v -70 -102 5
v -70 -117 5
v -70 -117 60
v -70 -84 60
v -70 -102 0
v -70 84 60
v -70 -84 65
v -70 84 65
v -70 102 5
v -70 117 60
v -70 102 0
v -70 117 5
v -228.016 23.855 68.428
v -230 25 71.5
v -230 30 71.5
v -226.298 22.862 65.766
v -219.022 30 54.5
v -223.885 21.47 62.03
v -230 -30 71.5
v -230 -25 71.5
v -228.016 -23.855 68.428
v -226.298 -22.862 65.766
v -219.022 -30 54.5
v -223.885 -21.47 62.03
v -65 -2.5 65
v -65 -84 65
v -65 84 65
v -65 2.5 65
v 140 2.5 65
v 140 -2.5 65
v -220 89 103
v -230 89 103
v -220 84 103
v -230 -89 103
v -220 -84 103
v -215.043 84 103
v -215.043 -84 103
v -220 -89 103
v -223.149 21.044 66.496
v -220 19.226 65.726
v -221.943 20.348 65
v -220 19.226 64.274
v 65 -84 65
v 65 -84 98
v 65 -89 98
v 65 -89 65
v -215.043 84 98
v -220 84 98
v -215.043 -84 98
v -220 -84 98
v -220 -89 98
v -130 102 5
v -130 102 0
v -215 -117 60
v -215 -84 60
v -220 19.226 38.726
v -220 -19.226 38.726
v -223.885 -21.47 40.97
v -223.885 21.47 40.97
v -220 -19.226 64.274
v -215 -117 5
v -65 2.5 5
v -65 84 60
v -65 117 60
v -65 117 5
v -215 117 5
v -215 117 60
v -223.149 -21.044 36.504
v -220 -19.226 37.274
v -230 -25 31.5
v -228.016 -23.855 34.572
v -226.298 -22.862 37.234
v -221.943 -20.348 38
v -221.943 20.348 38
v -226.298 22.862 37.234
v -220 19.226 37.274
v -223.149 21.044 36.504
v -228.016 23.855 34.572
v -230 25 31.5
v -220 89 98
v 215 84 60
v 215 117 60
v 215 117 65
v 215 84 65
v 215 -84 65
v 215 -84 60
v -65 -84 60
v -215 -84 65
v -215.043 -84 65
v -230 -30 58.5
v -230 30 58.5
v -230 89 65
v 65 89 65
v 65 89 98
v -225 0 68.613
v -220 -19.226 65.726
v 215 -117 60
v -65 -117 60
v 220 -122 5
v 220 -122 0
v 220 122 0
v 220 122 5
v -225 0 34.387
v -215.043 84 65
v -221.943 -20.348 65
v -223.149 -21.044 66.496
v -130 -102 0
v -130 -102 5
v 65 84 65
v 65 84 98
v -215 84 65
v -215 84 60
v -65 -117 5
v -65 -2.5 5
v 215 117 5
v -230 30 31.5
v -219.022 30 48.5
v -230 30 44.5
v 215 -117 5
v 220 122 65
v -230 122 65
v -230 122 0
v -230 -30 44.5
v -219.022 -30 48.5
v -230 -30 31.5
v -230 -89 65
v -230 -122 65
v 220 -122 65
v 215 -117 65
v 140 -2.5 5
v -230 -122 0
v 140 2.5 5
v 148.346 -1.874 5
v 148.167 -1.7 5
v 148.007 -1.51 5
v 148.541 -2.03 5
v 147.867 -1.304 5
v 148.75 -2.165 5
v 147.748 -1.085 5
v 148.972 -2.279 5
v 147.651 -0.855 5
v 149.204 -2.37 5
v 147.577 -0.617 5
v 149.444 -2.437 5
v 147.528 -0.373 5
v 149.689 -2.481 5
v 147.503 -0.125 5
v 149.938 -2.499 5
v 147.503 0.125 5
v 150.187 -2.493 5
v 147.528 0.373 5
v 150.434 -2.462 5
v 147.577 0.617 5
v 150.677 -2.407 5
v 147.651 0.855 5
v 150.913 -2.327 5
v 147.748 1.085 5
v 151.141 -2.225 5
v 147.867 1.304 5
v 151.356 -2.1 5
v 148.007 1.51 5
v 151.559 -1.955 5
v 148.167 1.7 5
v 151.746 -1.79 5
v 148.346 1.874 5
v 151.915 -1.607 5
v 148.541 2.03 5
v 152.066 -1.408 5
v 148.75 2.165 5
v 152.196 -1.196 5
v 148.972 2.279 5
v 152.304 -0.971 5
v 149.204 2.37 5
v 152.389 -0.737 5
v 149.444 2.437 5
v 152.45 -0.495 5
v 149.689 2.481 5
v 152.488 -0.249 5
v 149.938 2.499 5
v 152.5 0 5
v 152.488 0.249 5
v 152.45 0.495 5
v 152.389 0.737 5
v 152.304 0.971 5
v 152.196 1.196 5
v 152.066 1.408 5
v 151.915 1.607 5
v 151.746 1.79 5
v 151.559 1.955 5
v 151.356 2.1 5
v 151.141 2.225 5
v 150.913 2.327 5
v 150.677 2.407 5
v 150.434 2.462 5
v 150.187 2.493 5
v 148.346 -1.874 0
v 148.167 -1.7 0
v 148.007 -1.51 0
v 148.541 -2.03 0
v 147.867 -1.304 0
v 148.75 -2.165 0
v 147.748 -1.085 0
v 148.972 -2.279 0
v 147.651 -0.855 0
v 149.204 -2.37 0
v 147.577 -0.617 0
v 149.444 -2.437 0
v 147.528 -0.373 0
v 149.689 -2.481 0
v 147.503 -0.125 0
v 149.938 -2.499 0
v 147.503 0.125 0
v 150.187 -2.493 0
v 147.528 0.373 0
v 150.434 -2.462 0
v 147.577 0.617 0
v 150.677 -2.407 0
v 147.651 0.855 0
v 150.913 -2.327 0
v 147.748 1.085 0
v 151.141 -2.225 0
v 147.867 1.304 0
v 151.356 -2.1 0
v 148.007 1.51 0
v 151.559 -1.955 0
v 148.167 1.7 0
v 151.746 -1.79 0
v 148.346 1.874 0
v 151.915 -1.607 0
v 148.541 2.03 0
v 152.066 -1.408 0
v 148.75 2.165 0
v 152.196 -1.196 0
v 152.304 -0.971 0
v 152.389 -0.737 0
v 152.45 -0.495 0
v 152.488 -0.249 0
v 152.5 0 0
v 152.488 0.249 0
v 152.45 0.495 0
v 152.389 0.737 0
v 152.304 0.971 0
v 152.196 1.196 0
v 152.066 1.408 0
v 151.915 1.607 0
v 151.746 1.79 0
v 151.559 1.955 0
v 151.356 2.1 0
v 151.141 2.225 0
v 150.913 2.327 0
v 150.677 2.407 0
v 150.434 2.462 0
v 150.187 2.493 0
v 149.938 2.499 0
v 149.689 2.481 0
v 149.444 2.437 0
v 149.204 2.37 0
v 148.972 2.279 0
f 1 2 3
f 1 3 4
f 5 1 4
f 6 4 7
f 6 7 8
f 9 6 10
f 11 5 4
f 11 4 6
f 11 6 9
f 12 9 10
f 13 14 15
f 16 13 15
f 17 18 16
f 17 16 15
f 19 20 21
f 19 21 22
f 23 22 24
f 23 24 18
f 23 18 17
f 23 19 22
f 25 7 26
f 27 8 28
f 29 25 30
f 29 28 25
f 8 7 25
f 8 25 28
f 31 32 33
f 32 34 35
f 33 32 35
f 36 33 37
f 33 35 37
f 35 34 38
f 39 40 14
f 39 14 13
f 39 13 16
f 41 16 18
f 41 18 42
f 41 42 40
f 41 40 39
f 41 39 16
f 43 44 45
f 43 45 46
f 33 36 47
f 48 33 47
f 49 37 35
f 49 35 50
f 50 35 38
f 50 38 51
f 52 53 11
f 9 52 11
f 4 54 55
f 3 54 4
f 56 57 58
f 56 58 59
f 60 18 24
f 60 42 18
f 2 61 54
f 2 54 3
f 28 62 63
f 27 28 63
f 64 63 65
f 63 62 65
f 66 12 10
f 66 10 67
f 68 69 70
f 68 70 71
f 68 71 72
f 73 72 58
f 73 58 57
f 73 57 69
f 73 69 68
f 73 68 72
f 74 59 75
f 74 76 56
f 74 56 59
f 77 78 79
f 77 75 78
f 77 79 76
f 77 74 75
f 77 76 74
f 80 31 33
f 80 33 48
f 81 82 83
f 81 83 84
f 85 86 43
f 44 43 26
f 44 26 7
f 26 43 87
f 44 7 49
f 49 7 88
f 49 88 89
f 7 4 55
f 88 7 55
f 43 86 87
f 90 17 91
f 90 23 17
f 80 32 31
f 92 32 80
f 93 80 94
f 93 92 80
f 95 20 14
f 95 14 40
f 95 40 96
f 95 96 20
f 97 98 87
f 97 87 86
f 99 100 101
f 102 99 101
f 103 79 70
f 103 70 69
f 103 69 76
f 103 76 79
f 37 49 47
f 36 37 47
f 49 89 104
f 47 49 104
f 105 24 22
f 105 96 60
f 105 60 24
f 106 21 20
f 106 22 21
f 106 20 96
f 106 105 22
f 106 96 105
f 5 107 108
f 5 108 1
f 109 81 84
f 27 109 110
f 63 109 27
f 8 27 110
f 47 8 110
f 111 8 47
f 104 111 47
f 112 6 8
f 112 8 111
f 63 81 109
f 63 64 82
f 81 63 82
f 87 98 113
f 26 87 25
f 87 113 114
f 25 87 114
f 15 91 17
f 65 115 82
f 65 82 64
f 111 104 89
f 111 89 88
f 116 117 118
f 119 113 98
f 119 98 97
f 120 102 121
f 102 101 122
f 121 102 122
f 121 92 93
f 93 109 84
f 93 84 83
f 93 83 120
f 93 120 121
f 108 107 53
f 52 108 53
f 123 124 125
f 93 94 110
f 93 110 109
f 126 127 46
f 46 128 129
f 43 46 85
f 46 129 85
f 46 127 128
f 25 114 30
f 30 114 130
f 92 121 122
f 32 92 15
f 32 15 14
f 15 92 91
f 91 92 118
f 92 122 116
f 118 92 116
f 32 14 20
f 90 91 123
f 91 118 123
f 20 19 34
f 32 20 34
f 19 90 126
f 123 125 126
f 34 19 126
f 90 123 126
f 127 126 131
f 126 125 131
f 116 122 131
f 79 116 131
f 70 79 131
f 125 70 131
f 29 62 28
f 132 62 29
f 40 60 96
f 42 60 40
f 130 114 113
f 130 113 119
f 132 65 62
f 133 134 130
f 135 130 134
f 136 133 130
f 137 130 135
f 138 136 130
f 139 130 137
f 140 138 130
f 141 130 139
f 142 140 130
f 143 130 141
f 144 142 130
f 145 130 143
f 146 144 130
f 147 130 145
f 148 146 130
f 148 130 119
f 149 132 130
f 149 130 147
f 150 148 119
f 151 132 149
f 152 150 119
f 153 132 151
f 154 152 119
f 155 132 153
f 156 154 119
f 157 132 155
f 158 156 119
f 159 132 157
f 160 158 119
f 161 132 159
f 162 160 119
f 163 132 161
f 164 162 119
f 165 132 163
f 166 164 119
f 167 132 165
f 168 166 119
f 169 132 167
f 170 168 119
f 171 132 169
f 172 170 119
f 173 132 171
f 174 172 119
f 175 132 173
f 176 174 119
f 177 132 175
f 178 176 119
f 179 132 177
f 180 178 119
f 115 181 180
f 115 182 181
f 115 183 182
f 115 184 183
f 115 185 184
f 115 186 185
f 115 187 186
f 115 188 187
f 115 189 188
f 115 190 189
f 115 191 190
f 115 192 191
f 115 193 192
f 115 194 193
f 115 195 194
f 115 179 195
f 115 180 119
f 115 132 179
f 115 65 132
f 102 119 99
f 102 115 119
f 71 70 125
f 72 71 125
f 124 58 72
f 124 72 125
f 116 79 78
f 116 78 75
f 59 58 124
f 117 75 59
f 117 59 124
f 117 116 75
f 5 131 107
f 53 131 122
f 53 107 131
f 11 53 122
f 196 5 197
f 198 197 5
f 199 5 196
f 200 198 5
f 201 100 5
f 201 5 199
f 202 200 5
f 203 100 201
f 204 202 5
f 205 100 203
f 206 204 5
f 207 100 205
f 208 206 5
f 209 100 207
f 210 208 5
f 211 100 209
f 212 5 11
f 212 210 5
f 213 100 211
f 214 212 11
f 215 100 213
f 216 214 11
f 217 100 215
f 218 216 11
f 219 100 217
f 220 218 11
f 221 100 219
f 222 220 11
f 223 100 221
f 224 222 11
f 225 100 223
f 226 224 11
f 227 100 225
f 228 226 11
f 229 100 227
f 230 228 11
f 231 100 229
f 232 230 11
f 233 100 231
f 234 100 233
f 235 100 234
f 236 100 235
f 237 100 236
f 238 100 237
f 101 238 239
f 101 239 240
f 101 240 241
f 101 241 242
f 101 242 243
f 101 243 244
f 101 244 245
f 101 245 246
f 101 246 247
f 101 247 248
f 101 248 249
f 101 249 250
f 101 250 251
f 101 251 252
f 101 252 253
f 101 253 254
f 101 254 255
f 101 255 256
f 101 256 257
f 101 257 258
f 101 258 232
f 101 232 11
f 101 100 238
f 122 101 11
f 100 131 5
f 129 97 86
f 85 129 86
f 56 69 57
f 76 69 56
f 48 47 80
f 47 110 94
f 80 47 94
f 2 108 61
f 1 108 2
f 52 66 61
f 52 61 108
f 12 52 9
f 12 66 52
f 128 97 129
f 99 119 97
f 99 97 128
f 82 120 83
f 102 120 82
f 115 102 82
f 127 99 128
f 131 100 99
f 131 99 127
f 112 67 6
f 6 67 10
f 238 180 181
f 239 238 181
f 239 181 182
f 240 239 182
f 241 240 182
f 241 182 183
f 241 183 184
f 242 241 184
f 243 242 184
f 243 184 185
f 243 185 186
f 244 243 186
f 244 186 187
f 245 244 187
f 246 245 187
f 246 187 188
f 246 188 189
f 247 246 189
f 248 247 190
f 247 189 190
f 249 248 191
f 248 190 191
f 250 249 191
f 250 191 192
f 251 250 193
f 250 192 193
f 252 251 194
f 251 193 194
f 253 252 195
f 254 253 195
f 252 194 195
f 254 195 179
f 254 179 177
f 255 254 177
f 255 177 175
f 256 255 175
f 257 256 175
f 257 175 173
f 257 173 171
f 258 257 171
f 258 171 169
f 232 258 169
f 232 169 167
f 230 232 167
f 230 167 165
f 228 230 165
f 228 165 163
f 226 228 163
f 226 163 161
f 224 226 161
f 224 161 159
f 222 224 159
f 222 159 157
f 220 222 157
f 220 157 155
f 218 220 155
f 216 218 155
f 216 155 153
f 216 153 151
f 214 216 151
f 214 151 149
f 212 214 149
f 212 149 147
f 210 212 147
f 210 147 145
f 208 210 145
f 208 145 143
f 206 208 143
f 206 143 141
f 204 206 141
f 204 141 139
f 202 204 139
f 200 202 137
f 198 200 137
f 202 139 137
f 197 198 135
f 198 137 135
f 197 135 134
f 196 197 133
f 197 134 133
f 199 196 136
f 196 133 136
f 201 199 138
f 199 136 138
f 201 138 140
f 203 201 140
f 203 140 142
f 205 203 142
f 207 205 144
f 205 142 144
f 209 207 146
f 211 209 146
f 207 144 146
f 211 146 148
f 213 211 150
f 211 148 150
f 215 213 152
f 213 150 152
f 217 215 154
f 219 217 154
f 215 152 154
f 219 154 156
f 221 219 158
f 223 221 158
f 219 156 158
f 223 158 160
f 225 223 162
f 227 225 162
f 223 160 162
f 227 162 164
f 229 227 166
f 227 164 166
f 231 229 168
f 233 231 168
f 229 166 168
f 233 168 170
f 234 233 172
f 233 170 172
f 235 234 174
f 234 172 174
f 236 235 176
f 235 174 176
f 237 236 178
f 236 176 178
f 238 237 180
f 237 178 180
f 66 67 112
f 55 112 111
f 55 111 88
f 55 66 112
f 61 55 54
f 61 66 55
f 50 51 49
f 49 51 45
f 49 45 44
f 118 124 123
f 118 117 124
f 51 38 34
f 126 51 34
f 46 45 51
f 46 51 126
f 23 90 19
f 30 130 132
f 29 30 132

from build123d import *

# Parameters (mm, degrees)
SKETCH1_W           = 440
SKETCH1_H           = 244
SKETCH1_W_2         = 60
SKETCH1_H_2         = 204
BOSS_EXTRUDE1_DEPTH = 5
BOSS_EXTRUDE2_DEPTH = 60
SKETCH3_W           = 65
SKETCH3_H           = 244
BOSS_EXTRUDE3_DEPTH = 10
SKETCH9_W           = 430
SKETCH9_H           = 5
BOSS_EXTRUDE6_DEPTH = 33
BOSS_EXTRUDE7_DEPTH = 38
SKETCH11_W          = 38
SKETCH11_H          = 33
CUT_EXTRUDE3_DEPTH  = 38
SKETCH12_W          = 13
SKETCH12_H          = 50
CUT_EXTRUDE4_DEPTH  = 10
CUT_EXTRUDE4_TAPER  = 30
CUT_EXTRUDE6_DEPTH  = 30
SKETCH16_W          = 5
SKETCH16_H          = 5
CUT_EXTRUDE7_DEPTH  = 435
SKETCH17_W          = 5
SKETCH17_H          = 234
BOSS_EXTRUDE8_DEPTH = 60
SKETCH18_W          = 210
SKETCH18_H          = 5
BOSS_EXTRUDE9_DEPTH = 60
SKETCH19_R          = 2.5
CUT_EXTRUDE8_DEPTH  = 50
SKETCH22_W          = 33
SKETCH22_H          = 5
CUT_EXTRUDE10_DEPTH = 150


with BuildPart() as part:
    # Sketch1 → Boss-Extrude1 (new body)
    with BuildSketch(Plane.XY):
        Rectangle(SKETCH1_W, SKETCH1_H)
        with Locations((-100, 0)):
            Rectangle(SKETCH1_W_2, SKETCH1_H_2, mode=Mode.SUBTRACT)
    extrude(amount=BOSS_EXTRUDE1_DEPTH)

    # Sketch2 → Boss-Extrude2 (add)
    with BuildSketch(Plane.XY.offset(5)):
        Polygon((-215, -117), (215, -117), (220, -122), (-220, -122), (-220, 122), (220, 122), (215, 117), (-215, 117), align=None)
    extrude(amount=BOSS_EXTRUDE2_DEPTH)

    # Sketch3 → Boss-Extrude3 (add)
    with BuildSketch(Plane.ZY.offset(220)):
        with Locations((32.5, 0)):
            Rectangle(SKETCH3_W, SKETCH3_H)
    extrude(amount=BOSS_EXTRUDE3_DEPTH)

    # Sketch9 → Boss-Extrude6 (add)
    with BuildSketch(Plane(origin=(0, -117, 0), x_dir=(1, 0, 0), z_dir=(0, 1, 0))):
        with Locations((0, -62.5)):
            Rectangle(SKETCH9_W, SKETCH9_H)
    boss_extrude6 = extrude(amount=BOSS_EXTRUDE6_DEPTH)

    # Sketch10 → Boss-Extrude7 (add)
    with BuildSketch(Plane.XY.offset(65)):
        Polygon((215, -84), (-215.042545238, -84), (-215.042545238, 122), (-230, 122), (-230, -89), (-215.042545238, -89), (215, -89), align=None)
    boss_extrude7 = extrude(amount=BOSS_EXTRUDE7_DEPTH)

    # Mirror4: Boss-Extrude6, Boss-Extrude7 across plane
    add(boss_extrude6.mirror(Plane.ZX))
    add(boss_extrude7.mirror(Plane.ZX))

    # Sketch11 → Cut-Extrude3 (cut)
    with BuildSketch(Plane(origin=(-215.042545238, 0, 0), x_dir=(0, 0, -1), z_dir=(1, 0, 0))):
        with Locations((-84, 105.5)):
            Rectangle(SKETCH11_W, SKETCH11_H)
        with Locations((-84, -105.5)):
            Rectangle(SKETCH11_W, SKETCH11_H)
    extrude(amount=-CUT_EXTRUDE3_DEPTH, mode=Mode.SUBTRACT)

    # Sketch12 → Cut-Extrude4 (cut)
    with BuildSketch(Plane.ZY.offset(230)):
        with Locations((38, 0)):
            Rectangle(SKETCH12_W, SKETCH12_H)
        with Locations((65, 0)):
            Rectangle(SKETCH12_W, SKETCH12_H)
    extrude(amount=-CUT_EXTRUDE4_DEPTH, taper=CUT_EXTRUDE4_TAPER, mode=Mode.SUBTRACT)

    # Sketch14 → Cut-Extrude6 (cut, symmetric)
    with BuildSketch(Plane(origin=(0, 0, 0), x_dir=(1, 0, 0), z_dir=(0, 1, 0))):
        Polygon((-230, -71.5), (-219.022191852, -54.5), (-230, -58.5), align=None)
        Polygon((-230, -31.5), (-219.022191852, -48.5), (-230, -44.5), align=None)
    extrude(amount=CUT_EXTRUDE6_DEPTH, both=True, mode=Mode.SUBTRACT)

    # Sketch16 → Cut-Extrude7 (cut)
    with BuildSketch(Plane(origin=(215, 0, 0), x_dir=(0, 0, -1), z_dir=(1, 0, 0))):
        with Locations((-100.5, -86.5)):
            Rectangle(SKETCH16_W, SKETCH16_H)
        with Locations((-100.5, 86.5)):
            Rectangle(SKETCH16_W, SKETCH16_H)
    extrude(amount=-CUT_EXTRUDE7_DEPTH, mode=Mode.SUBTRACT)

    # Sketch17 → Boss-Extrude8 (add)
    with BuildSketch(Plane.XY.offset(5)):
        with Locations((-67.5, 0)):
            Rectangle(SKETCH17_W, SKETCH17_H)
    extrude(amount=BOSS_EXTRUDE8_DEPTH)

    # Sketch18 → Boss-Extrude9 (add)
    with BuildSketch(Plane.XY.offset(5)):
        with Locations((35, 0)):
            Rectangle(SKETCH18_W, SKETCH18_H)
    extrude(amount=BOSS_EXTRUDE9_DEPTH)

    # Sketch19 → Cut-Extrude8 (cut)
    with BuildSketch(Plane.XY.offset(5)):
        with Locations((150, 0)):
            Circle(SKETCH19_R)
    extrude(amount=-CUT_EXTRUDE8_DEPTH, mode=Mode.SUBTRACT)

    # Sketch22 → Cut-Extrude10 (cut)
    with BuildSketch(Plane(origin=(215, 0, 0), x_dir=(0, 0, -1), z_dir=(1, 0, 0))):
        with Locations((-81.5, -86.5)):
            Rectangle(SKETCH22_W, SKETCH22_H)
        with Locations((-81.5, 86.5)):
            Rectangle(SKETCH22_W, SKETCH22_H)
    extrude(amount=-CUT_EXTRUDE10_DEPTH, mode=Mode.SUBTRACT)


solid = part.part
